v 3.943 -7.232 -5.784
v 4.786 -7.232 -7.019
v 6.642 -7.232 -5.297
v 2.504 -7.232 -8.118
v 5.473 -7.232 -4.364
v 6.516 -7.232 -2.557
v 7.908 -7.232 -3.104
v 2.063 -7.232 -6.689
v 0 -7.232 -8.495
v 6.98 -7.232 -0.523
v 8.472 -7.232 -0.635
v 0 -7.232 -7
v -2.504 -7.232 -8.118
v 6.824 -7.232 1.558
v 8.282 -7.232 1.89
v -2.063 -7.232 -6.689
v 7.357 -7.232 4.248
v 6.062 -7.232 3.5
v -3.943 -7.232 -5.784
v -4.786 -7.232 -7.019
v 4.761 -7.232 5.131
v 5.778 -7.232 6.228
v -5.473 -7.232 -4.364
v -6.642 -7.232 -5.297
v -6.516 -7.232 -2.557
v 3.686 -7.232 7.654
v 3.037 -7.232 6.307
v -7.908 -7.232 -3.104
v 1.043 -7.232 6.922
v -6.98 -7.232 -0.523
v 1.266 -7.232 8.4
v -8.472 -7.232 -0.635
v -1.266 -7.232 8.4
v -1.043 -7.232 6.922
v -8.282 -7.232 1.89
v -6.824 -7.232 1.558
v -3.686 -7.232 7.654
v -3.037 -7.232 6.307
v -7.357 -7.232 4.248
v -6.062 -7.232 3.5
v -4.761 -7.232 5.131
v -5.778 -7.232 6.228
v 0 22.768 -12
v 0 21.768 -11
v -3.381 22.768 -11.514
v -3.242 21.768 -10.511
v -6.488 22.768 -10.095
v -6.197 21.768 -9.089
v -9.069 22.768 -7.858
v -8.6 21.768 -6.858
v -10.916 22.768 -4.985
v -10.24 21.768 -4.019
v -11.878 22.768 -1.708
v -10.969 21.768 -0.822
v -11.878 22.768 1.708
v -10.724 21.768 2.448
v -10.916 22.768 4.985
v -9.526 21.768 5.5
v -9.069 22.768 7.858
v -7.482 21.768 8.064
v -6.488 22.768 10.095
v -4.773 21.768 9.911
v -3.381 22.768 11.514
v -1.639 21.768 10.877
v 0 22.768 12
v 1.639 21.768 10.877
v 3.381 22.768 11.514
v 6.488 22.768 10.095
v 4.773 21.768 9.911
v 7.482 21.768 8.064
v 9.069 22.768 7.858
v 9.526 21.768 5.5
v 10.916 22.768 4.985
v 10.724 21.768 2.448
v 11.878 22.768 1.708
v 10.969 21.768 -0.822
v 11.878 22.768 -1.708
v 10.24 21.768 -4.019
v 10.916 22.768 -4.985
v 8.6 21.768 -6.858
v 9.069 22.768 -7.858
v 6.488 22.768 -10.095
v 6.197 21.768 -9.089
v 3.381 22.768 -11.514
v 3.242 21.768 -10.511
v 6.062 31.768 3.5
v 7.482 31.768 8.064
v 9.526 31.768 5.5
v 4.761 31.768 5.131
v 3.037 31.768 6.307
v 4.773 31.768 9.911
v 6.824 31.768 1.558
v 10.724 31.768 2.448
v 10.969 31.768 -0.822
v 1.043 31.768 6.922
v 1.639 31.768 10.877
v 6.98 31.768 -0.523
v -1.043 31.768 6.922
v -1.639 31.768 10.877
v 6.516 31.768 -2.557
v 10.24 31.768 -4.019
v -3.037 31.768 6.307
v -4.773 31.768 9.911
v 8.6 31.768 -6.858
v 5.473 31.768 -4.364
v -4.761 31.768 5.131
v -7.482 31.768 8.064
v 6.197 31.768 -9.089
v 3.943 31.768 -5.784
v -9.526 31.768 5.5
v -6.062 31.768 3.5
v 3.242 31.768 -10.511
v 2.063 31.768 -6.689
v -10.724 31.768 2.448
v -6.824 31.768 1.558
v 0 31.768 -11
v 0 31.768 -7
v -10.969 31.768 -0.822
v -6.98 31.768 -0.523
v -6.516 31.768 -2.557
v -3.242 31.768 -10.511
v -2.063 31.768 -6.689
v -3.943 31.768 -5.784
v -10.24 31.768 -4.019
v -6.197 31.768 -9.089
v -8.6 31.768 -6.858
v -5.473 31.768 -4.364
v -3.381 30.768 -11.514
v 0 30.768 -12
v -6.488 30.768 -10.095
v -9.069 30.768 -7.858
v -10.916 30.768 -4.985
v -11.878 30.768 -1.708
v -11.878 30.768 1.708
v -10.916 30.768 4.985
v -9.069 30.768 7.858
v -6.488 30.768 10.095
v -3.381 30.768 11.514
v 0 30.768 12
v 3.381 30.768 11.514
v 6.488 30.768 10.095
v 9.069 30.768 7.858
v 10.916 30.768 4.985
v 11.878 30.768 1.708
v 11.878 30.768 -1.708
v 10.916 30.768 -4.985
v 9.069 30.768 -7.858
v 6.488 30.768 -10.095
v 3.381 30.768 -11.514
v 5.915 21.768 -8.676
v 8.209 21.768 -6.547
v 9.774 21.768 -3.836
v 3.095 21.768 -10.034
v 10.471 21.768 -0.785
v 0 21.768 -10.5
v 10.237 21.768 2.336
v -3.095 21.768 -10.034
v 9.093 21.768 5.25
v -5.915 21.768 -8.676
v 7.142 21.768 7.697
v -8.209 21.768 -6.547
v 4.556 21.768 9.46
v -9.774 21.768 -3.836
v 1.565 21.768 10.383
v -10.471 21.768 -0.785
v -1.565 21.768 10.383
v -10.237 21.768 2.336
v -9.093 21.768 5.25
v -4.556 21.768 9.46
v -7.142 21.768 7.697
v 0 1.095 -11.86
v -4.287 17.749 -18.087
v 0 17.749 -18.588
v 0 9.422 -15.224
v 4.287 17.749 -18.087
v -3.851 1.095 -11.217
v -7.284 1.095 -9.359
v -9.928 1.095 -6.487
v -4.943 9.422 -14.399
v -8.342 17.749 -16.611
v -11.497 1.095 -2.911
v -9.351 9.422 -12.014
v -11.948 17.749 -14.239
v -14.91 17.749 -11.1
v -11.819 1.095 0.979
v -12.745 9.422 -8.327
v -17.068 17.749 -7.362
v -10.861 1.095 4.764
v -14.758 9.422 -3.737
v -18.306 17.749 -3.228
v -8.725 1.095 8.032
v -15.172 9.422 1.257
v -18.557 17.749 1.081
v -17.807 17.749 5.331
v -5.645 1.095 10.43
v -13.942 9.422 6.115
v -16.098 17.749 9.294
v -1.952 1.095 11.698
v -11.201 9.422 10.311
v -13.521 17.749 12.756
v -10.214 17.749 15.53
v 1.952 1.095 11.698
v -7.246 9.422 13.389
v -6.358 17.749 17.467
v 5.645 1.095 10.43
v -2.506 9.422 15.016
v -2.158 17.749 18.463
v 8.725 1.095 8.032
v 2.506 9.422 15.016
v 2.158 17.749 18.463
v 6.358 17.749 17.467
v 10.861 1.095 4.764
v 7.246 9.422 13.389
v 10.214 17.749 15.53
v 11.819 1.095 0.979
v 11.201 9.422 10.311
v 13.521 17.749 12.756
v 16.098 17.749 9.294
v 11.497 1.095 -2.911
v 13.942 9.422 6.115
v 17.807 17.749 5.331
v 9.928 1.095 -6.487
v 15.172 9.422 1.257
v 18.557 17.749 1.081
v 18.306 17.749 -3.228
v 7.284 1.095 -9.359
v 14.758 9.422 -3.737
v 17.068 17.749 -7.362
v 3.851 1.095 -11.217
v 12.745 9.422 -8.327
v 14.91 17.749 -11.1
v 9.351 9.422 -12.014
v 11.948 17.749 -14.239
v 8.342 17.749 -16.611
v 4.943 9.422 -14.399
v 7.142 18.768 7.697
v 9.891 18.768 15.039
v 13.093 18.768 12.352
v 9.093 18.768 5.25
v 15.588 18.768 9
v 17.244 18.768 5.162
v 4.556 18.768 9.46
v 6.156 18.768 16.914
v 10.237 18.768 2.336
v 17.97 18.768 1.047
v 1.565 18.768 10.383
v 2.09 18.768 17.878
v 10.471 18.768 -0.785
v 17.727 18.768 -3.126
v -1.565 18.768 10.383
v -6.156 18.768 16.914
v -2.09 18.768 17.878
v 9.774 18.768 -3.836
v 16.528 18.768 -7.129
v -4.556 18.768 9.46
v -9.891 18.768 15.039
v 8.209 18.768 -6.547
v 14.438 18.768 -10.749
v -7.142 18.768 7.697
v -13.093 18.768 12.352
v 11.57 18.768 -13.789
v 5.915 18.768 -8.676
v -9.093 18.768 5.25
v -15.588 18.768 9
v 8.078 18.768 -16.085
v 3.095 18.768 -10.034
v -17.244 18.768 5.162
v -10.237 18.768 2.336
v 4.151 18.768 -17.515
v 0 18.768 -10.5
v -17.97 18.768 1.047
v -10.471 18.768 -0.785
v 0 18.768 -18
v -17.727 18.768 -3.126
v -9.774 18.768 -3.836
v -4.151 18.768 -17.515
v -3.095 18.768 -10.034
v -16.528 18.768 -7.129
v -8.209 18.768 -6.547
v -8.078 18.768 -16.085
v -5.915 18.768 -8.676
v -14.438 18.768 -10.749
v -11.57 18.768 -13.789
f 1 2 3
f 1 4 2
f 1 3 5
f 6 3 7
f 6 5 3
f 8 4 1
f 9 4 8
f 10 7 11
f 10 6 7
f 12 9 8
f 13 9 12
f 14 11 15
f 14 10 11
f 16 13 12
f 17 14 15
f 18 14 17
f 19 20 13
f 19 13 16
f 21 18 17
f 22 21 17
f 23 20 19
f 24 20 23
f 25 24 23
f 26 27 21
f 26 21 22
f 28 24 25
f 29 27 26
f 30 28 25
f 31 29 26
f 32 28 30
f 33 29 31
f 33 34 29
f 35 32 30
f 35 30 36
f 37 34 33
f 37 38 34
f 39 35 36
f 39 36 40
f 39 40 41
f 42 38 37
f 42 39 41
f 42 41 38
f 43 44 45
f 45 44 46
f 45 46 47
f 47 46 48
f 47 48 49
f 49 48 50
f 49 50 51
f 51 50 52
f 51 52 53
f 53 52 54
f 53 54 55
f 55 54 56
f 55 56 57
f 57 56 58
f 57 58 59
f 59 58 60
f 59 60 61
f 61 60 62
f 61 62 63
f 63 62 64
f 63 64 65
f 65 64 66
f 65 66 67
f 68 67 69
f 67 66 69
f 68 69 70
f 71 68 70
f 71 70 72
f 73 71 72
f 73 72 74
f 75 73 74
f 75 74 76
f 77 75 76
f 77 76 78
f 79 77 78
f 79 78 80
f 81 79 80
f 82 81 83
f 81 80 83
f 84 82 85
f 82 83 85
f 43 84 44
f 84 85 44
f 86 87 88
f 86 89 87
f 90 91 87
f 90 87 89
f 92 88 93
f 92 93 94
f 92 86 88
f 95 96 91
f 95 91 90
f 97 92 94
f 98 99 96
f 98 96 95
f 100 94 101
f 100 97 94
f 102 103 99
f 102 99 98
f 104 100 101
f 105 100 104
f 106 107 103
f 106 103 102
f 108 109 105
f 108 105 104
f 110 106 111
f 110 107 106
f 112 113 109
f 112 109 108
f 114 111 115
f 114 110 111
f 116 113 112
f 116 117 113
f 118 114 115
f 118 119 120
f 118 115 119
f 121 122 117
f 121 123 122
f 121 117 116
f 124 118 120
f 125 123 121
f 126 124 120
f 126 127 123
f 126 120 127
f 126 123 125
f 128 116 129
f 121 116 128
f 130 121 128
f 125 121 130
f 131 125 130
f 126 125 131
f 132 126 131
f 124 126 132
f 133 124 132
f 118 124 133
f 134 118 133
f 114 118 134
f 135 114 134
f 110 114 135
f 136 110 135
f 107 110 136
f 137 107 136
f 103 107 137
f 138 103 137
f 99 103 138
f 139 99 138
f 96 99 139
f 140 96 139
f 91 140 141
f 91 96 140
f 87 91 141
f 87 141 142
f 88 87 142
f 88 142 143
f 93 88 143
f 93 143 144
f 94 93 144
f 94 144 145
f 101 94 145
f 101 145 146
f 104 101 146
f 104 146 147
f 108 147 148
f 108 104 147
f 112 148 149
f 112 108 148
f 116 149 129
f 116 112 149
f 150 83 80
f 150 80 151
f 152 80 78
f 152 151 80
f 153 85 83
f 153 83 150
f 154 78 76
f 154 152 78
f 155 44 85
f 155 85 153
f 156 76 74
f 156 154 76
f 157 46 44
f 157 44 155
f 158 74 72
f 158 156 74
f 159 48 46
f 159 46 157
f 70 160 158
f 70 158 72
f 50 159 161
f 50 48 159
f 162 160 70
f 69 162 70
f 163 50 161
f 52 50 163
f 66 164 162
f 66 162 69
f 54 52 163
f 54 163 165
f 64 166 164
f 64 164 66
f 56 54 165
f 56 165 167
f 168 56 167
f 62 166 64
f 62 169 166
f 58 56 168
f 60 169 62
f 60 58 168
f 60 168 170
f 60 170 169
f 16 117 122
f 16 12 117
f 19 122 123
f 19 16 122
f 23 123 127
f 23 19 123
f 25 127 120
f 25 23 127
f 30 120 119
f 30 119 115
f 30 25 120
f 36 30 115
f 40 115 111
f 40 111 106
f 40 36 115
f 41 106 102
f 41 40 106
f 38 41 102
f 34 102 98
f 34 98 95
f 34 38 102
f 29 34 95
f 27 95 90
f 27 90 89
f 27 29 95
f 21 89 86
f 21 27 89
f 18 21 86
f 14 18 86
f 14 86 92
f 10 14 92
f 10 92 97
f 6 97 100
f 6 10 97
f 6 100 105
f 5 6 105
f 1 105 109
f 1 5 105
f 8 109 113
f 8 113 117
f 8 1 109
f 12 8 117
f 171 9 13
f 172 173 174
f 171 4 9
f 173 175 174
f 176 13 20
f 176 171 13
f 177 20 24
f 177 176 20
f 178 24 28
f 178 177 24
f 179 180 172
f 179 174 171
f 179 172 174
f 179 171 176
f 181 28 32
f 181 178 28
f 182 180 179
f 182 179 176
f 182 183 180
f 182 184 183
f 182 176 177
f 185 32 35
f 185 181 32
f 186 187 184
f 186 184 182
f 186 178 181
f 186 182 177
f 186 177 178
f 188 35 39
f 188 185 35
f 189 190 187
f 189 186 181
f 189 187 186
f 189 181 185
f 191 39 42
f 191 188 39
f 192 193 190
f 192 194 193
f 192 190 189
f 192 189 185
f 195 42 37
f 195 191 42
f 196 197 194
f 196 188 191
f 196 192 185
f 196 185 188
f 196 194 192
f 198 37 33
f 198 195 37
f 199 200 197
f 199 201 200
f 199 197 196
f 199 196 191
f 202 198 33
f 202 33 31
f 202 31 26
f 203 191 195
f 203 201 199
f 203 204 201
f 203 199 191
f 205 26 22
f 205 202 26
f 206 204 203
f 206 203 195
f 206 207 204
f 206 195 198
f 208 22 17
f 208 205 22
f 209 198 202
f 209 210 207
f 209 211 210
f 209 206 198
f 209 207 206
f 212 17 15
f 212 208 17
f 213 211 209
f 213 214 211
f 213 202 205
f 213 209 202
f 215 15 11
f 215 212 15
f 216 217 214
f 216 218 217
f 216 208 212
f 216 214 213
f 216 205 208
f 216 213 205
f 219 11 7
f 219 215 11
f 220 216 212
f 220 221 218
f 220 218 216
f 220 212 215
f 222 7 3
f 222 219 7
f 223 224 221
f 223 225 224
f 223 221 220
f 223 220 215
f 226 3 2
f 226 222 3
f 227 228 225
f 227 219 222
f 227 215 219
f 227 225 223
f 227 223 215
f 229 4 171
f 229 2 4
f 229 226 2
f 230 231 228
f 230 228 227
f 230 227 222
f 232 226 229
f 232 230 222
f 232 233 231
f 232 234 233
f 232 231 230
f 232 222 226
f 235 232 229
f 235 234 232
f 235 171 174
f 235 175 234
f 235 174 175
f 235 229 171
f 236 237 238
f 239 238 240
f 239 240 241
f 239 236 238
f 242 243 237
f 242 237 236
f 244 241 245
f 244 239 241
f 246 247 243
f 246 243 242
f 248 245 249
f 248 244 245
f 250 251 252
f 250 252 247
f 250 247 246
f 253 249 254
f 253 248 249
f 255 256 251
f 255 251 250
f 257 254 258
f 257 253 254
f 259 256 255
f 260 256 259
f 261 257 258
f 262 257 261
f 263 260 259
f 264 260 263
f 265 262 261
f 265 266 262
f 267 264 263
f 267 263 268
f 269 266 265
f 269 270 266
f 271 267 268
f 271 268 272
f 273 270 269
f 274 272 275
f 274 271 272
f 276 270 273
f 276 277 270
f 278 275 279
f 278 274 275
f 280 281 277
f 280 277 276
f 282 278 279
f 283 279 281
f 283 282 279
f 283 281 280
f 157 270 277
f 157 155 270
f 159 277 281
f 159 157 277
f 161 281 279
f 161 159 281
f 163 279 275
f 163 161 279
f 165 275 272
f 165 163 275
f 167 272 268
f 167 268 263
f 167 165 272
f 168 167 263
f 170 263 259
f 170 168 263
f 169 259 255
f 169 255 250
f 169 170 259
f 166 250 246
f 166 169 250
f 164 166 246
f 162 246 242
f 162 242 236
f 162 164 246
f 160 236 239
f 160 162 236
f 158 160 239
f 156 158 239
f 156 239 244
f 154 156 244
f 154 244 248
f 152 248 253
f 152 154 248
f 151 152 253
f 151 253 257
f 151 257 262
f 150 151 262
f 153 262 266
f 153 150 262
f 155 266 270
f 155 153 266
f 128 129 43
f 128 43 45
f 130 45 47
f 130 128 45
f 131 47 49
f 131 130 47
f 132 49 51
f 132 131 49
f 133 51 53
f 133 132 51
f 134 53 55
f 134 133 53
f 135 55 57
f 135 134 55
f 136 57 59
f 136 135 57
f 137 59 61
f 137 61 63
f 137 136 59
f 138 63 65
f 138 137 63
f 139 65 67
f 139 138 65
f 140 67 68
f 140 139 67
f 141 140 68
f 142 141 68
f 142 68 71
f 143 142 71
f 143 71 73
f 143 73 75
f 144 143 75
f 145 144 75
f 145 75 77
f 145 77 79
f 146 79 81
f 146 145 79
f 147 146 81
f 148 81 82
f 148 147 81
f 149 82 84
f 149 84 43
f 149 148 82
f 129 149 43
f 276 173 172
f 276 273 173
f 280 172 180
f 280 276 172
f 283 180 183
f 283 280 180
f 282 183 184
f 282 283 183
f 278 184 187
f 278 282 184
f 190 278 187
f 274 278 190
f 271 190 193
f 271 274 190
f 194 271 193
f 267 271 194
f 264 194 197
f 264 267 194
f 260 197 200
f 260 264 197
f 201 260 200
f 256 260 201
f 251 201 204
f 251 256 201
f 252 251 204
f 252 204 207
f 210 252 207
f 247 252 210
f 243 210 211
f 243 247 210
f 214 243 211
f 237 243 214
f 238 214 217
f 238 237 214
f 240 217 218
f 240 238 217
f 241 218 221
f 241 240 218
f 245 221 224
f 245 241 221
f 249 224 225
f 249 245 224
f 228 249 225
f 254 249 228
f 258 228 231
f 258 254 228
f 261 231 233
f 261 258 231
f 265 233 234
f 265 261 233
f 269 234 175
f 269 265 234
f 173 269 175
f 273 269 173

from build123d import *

# Parameters (mm, degrees)
CHANFRO1_SIZE = 1
CHANFRO2_SIZE = 1


with BuildPart() as part:
    # Esboço1 → Revolução1 (revolve)
    with BuildSketch(Plane(origin=(0, 0, 0), x_dir=(0, 0, -1), z_dir=(1, 0, 0))):
        Polygon((18, 18.768101913), (10.5, 18.768101913), (10.5, 21.768101913), (12, 21.768101913), (12, 31.768101913), (7, 31.768101913), (7, -7.231898087), (8.495318128, -7.231898087), (18.5883066, 17.749124991), align=None)
    revolve(axis=Axis((0, 0, 0), (0, 1, 0)))

    # Chanfro1
    chanfro1_edges = [part.edges().sort_by_distance(p)[0] for p in [
        (0, 31.768101913, 12),
    ]]
    chamfer(chanfro1_edges, length=CHANFRO1_SIZE)

    # Chanfro2
    chanfro2_edges = [part.edges().sort_by_distance(p)[0] for p in [
        (0, 21.768101913, 12),
    ]]
    chamfer(chanfro2_edges, length=CHANFRO2_SIZE)


solid = part.part
